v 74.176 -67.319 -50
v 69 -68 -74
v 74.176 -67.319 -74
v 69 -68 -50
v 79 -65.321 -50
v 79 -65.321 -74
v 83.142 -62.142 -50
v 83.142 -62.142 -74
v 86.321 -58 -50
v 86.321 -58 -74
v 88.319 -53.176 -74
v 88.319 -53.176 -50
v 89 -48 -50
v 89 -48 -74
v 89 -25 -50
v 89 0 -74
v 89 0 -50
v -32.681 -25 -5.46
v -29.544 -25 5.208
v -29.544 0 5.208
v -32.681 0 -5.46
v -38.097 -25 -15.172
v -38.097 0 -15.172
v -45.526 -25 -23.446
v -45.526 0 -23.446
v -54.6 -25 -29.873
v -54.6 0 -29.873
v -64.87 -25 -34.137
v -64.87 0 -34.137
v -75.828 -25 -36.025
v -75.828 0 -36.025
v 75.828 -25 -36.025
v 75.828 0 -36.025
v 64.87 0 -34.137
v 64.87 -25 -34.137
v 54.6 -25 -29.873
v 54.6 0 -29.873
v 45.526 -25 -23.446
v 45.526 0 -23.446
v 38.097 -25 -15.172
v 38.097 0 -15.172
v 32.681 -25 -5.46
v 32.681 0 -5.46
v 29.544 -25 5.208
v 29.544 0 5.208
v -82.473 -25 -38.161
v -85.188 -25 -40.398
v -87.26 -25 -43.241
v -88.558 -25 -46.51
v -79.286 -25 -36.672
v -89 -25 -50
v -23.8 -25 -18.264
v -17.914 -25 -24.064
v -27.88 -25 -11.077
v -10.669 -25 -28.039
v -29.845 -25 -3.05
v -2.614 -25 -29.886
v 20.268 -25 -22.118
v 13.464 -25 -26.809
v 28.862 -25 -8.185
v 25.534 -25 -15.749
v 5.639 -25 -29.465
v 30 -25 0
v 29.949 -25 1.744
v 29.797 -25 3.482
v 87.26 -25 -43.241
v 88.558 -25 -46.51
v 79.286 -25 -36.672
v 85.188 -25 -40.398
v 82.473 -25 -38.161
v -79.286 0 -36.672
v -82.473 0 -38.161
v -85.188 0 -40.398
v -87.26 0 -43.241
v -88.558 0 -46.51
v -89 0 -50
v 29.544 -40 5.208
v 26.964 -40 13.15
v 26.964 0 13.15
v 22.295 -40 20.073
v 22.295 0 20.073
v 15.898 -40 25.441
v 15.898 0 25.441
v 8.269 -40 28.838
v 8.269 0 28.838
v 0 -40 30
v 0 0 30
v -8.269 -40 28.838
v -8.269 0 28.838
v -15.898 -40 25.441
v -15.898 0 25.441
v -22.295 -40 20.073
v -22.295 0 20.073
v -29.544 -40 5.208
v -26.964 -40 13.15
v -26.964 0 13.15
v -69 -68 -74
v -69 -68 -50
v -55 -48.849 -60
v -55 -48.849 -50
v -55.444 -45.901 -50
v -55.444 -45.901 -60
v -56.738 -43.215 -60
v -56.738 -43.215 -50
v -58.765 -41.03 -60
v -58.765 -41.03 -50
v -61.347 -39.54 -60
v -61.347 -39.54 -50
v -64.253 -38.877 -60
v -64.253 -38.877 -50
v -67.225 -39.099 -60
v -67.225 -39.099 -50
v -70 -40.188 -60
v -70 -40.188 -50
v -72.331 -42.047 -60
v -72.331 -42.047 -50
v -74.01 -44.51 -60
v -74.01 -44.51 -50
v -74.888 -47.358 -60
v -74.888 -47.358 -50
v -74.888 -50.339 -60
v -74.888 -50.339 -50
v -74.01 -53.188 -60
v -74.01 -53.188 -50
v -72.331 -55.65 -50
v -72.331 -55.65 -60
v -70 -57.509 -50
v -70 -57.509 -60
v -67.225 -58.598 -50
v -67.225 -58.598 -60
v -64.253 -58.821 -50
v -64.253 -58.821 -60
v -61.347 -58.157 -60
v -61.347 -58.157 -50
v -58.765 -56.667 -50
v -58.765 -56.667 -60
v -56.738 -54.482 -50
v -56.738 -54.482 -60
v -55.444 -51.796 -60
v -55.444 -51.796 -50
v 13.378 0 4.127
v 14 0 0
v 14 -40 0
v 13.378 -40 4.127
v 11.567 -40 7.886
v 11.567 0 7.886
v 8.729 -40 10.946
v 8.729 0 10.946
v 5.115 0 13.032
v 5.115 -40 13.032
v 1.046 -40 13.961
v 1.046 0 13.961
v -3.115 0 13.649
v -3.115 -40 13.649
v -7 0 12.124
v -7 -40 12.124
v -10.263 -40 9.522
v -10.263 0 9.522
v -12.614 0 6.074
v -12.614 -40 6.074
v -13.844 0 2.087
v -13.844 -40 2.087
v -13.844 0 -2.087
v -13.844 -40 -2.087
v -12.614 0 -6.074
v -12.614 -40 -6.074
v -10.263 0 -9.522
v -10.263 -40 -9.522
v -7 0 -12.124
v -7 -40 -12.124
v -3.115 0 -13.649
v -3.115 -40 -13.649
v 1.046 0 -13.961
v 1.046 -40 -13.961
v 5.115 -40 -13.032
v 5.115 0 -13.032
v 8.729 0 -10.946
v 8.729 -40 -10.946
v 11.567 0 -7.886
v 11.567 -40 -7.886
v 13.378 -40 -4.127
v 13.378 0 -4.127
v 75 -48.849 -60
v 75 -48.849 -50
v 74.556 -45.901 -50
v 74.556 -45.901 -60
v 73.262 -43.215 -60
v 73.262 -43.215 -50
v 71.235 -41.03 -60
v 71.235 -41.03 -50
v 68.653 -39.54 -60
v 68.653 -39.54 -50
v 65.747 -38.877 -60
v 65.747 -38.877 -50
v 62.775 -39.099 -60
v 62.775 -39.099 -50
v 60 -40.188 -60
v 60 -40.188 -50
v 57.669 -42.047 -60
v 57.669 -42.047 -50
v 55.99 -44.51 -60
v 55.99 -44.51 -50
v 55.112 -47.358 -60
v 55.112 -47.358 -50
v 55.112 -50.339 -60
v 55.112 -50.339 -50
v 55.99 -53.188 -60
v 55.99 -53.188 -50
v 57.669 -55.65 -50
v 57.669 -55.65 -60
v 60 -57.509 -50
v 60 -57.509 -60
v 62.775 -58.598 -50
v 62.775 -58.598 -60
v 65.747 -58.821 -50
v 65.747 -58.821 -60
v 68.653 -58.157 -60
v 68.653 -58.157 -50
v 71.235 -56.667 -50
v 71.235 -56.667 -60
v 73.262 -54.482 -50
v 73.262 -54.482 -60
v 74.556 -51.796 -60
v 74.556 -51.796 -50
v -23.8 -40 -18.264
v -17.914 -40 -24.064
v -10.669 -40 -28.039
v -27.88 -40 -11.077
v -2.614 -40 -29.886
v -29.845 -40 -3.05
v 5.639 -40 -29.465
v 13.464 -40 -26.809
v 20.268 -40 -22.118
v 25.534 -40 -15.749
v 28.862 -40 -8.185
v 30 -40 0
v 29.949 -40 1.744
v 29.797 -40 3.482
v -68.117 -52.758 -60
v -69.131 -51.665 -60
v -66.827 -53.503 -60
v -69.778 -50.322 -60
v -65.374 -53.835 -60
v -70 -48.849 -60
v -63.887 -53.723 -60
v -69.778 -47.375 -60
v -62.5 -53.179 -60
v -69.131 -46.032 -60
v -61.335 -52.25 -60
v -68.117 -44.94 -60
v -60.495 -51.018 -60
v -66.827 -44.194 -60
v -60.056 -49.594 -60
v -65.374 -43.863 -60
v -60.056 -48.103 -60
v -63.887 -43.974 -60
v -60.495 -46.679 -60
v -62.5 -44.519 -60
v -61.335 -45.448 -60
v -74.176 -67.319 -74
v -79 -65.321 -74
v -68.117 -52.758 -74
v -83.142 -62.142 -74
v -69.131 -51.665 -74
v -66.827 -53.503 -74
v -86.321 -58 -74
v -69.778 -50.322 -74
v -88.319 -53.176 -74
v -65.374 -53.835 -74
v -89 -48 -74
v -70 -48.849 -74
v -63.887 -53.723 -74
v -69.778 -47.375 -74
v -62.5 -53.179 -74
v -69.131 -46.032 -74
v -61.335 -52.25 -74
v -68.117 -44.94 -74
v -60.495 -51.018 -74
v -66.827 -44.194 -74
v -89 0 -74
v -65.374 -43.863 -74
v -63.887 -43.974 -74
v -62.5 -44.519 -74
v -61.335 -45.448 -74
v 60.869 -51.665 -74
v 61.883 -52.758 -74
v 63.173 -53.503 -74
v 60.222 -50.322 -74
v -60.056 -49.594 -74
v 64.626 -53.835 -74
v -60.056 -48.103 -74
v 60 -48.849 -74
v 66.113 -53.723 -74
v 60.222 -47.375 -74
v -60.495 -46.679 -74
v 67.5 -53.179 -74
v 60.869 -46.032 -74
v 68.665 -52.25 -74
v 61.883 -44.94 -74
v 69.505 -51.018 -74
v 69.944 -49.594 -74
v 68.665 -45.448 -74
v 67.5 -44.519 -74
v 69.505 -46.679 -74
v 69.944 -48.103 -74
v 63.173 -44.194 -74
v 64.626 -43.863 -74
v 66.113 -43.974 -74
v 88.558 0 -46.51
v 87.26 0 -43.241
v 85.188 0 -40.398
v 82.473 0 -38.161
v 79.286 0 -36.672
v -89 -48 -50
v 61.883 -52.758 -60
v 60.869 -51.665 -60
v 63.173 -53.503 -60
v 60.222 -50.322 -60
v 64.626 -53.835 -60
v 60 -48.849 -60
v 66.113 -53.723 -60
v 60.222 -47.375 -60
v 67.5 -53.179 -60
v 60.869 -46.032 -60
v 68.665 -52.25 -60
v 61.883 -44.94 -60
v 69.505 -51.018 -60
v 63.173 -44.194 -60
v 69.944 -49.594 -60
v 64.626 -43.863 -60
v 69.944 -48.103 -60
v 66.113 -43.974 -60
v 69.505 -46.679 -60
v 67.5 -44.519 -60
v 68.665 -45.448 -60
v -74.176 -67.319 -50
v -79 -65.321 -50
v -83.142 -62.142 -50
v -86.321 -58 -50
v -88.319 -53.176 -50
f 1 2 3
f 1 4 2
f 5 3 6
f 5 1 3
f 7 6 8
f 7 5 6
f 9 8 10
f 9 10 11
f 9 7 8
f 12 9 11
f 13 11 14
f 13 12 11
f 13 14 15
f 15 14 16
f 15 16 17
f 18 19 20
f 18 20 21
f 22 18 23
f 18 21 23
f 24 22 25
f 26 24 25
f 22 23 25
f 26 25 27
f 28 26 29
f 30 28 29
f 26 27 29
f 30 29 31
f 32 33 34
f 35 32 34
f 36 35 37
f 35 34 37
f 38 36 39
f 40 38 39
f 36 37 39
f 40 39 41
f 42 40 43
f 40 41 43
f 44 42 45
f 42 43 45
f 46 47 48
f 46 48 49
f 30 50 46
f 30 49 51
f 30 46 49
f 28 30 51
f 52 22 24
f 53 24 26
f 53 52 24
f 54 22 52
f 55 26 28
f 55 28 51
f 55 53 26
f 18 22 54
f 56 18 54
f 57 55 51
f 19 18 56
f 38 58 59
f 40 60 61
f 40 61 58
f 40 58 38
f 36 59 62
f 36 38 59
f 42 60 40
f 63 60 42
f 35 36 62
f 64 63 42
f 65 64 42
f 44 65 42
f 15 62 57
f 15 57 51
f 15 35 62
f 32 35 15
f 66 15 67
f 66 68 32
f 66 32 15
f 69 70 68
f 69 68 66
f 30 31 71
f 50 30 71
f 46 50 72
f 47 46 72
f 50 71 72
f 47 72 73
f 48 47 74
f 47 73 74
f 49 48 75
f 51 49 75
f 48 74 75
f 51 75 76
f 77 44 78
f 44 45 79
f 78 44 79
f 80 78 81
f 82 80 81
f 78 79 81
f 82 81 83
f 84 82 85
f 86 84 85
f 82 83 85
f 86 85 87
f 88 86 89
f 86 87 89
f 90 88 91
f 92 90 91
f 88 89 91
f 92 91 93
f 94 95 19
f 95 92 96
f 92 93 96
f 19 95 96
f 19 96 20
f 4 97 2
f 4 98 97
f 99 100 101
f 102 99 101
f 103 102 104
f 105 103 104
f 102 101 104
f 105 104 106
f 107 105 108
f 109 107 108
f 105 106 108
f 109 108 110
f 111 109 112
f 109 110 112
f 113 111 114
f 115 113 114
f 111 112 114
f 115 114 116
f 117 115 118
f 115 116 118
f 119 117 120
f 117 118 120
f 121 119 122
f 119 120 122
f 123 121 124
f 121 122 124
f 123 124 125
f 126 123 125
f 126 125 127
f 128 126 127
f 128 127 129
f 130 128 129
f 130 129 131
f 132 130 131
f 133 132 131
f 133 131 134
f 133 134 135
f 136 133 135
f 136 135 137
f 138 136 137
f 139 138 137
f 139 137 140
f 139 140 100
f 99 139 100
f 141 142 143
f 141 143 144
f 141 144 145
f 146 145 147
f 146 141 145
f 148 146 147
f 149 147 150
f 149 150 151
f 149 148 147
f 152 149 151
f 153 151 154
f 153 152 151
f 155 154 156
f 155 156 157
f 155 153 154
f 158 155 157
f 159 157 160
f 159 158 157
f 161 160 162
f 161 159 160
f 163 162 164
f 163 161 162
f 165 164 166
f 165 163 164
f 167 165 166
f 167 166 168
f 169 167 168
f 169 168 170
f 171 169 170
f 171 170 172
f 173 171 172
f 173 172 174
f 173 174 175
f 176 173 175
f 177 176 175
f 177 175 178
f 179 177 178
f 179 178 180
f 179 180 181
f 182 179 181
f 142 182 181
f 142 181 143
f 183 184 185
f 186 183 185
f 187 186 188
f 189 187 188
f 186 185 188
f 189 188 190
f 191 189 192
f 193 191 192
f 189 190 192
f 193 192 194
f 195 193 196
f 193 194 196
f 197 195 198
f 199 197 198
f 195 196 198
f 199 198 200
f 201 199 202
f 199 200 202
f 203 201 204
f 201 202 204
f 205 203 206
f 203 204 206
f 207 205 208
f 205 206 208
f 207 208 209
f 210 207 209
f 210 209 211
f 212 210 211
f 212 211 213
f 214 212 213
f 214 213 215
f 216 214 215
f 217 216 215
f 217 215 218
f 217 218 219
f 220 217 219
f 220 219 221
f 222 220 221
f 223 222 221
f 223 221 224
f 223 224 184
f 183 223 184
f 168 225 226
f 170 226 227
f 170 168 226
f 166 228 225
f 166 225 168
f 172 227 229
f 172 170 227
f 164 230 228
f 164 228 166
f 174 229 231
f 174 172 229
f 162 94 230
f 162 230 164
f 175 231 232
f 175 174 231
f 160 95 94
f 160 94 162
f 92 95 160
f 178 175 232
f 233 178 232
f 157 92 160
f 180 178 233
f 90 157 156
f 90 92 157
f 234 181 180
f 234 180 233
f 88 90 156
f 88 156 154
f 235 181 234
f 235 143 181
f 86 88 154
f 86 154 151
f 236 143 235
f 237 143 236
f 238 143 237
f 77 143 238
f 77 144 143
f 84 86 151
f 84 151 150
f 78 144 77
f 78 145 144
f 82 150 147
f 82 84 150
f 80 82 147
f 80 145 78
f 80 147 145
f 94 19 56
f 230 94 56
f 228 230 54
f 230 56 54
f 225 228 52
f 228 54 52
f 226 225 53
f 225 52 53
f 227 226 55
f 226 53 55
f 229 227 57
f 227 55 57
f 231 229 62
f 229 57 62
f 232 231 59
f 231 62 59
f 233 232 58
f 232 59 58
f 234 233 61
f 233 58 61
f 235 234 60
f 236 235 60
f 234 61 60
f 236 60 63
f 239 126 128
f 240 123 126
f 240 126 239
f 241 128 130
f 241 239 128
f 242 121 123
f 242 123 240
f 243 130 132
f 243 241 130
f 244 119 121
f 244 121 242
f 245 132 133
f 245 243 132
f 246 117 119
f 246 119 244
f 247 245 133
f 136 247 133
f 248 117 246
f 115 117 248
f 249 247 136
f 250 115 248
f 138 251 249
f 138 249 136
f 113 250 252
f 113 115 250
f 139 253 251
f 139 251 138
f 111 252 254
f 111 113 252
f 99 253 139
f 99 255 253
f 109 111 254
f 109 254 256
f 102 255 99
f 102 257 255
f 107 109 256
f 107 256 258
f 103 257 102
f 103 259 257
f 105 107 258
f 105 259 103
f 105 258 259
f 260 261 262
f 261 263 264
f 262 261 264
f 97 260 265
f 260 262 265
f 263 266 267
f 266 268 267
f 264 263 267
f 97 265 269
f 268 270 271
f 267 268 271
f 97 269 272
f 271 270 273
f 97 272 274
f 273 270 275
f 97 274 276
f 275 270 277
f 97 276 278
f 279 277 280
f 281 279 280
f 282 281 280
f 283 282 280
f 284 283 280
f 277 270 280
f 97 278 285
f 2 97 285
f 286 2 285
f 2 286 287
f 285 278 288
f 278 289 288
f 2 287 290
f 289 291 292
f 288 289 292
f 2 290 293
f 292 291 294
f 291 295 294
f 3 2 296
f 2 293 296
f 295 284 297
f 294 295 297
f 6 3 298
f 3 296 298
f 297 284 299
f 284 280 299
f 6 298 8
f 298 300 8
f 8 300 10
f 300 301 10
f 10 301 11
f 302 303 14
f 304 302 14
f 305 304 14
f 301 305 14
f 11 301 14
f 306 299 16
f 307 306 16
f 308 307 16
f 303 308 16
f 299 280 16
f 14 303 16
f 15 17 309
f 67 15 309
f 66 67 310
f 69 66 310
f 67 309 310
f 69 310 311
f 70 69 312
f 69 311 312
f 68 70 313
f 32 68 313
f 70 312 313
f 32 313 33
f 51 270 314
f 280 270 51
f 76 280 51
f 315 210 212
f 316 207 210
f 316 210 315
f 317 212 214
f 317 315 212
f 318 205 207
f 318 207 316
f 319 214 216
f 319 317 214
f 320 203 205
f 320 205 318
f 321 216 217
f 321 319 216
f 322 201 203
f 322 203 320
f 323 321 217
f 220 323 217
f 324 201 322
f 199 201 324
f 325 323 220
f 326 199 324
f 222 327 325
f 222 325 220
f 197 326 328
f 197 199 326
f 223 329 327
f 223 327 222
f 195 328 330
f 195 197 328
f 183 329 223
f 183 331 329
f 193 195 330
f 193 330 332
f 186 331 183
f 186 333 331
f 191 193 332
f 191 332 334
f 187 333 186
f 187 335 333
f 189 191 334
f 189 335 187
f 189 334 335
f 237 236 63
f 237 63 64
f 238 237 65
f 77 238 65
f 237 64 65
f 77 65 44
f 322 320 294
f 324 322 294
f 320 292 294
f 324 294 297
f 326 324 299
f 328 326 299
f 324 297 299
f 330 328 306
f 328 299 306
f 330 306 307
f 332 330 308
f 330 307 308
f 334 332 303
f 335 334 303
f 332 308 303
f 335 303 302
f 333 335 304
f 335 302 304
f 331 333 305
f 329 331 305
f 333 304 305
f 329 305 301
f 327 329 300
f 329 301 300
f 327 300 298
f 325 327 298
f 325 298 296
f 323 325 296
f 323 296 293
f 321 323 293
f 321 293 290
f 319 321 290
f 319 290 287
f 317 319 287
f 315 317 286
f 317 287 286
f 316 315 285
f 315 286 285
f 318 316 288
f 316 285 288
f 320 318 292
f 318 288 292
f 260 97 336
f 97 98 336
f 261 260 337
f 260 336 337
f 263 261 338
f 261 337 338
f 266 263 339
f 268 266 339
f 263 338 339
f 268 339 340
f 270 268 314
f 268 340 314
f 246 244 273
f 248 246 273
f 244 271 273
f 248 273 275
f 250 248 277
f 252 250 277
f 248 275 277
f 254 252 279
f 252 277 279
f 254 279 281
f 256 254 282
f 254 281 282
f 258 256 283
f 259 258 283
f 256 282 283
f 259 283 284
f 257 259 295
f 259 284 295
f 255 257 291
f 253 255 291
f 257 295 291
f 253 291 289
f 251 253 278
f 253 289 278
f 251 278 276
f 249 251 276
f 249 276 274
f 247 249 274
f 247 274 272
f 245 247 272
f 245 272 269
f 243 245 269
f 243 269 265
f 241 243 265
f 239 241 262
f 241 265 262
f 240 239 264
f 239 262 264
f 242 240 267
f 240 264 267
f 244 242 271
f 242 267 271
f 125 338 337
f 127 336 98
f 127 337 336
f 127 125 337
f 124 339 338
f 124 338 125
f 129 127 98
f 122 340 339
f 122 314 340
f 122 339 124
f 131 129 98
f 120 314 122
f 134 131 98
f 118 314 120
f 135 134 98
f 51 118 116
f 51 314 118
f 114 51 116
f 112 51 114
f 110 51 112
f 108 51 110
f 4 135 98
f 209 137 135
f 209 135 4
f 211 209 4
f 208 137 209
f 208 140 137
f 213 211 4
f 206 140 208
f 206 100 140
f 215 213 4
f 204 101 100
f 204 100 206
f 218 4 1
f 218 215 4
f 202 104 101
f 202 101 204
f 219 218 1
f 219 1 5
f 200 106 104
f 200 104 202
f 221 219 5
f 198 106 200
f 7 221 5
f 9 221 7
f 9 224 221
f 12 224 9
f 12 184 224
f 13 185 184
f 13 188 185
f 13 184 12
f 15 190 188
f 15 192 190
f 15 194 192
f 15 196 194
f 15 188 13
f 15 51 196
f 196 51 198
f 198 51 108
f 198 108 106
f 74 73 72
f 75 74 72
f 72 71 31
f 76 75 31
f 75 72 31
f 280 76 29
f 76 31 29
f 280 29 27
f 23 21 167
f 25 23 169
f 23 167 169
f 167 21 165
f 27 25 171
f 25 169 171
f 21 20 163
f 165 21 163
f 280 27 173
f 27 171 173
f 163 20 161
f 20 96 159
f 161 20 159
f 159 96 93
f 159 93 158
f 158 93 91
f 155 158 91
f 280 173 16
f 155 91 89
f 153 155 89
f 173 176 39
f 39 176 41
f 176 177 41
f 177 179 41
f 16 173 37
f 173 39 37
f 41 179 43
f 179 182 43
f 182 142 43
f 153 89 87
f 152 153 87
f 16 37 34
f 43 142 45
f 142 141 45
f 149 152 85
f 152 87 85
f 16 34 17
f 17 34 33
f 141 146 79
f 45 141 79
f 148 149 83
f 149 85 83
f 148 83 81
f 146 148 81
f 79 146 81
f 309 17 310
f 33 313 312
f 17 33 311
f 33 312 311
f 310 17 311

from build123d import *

# Parameters (mm, degrees)
F0_R           = 14
F0_W           = 178
F0_H           = 24
F1_DEPTH       = 25
F2_DEPTH       = 40
F3_DEPTH       = 68
F4_R           = 20
F6_D           = 10
F6_CBORE_D     = 20
F6_CBORE_DEPTH = 10


with BuildPart() as f1:
    # F0 (on Front) → F1 (new body)
    with BuildSketch(Plane.XZ):
        with BuildLine():
            ThreePointArc((-29.54449, 5.207985), (-2.613934, -29.885906), (30, 0))
            ThreePointArc((30, 0), (29.885906, 2.613934), (29.54449, 5.207985))
            ThreePointArc((29.54449, 5.207985), (0, 30), (-29.54449, 5.207985))
        make_face()
        Circle(F0_R, mode=Mode.SUBTRACT)
        with BuildLine():
            ThreePointArc((29.54449, 5.207985), (29.885906, 2.613934), (30, 0))
            ThreePointArc((30, 0), (-2.613934, -29.885906), (-29.54449, 5.207985))
            ThreePointArc((-29.54449, 5.207985), (-45.525876, -23.445808), (-75.828036, -36.024509))
            ThreePointArc((-75.828036, -36.024509), (-85.188045, -40.397722), (-89, -50))
            Line((-89, -50), (89, -50))
            ThreePointArc((89, -50), (85.188045, -40.397722), (75.828036, -36.024509))
            ThreePointArc((75.828036, -36.024509), (45.525876, -23.445808), (29.54449, 5.207985))
        make_face()
        with Locations((0, -62)):
            Rectangle(F0_W, F0_H)
    extrude(amount=F1_DEPTH)

    # F0 (on Front) → F2 (join)
    with BuildSketch(Plane.XZ):
        with BuildLine():
            ThreePointArc((-29.54449, 5.207985), (-2.613934, -29.885906), (30, 0))
            ThreePointArc((30, 0), (29.885906, 2.613934), (29.54449, 5.207985))
            ThreePointArc((29.54449, 5.207985), (0, 30), (-29.54449, 5.207985))
        make_face()
        Circle(F0_R, mode=Mode.SUBTRACT)
    extrude(amount=F2_DEPTH)

    # F0 (on Front) → F3 (join)
    with BuildSketch(Plane.XZ):
        with Locations((0, -62)):
            Rectangle(F0_W, F0_H)
    extrude(amount=F3_DEPTH)

    # F4
    f4_edges = [f1.edges().sort_by_distance(p)[0] for p in [
        (-89, -68, -62),
        (89, -68, -62),
    ]]
    fillet(f4_edges, radius=F4_R)

    # F6 (through all)
    with Locations(Plane.XY.offset(-50)):
        with Locations((-65, -48.848685), (65, -48.848685)):
            CounterBoreHole(F6_D / 2, F6_CBORE_D / 2, F6_CBORE_DEPTH)


solid = f1.part
